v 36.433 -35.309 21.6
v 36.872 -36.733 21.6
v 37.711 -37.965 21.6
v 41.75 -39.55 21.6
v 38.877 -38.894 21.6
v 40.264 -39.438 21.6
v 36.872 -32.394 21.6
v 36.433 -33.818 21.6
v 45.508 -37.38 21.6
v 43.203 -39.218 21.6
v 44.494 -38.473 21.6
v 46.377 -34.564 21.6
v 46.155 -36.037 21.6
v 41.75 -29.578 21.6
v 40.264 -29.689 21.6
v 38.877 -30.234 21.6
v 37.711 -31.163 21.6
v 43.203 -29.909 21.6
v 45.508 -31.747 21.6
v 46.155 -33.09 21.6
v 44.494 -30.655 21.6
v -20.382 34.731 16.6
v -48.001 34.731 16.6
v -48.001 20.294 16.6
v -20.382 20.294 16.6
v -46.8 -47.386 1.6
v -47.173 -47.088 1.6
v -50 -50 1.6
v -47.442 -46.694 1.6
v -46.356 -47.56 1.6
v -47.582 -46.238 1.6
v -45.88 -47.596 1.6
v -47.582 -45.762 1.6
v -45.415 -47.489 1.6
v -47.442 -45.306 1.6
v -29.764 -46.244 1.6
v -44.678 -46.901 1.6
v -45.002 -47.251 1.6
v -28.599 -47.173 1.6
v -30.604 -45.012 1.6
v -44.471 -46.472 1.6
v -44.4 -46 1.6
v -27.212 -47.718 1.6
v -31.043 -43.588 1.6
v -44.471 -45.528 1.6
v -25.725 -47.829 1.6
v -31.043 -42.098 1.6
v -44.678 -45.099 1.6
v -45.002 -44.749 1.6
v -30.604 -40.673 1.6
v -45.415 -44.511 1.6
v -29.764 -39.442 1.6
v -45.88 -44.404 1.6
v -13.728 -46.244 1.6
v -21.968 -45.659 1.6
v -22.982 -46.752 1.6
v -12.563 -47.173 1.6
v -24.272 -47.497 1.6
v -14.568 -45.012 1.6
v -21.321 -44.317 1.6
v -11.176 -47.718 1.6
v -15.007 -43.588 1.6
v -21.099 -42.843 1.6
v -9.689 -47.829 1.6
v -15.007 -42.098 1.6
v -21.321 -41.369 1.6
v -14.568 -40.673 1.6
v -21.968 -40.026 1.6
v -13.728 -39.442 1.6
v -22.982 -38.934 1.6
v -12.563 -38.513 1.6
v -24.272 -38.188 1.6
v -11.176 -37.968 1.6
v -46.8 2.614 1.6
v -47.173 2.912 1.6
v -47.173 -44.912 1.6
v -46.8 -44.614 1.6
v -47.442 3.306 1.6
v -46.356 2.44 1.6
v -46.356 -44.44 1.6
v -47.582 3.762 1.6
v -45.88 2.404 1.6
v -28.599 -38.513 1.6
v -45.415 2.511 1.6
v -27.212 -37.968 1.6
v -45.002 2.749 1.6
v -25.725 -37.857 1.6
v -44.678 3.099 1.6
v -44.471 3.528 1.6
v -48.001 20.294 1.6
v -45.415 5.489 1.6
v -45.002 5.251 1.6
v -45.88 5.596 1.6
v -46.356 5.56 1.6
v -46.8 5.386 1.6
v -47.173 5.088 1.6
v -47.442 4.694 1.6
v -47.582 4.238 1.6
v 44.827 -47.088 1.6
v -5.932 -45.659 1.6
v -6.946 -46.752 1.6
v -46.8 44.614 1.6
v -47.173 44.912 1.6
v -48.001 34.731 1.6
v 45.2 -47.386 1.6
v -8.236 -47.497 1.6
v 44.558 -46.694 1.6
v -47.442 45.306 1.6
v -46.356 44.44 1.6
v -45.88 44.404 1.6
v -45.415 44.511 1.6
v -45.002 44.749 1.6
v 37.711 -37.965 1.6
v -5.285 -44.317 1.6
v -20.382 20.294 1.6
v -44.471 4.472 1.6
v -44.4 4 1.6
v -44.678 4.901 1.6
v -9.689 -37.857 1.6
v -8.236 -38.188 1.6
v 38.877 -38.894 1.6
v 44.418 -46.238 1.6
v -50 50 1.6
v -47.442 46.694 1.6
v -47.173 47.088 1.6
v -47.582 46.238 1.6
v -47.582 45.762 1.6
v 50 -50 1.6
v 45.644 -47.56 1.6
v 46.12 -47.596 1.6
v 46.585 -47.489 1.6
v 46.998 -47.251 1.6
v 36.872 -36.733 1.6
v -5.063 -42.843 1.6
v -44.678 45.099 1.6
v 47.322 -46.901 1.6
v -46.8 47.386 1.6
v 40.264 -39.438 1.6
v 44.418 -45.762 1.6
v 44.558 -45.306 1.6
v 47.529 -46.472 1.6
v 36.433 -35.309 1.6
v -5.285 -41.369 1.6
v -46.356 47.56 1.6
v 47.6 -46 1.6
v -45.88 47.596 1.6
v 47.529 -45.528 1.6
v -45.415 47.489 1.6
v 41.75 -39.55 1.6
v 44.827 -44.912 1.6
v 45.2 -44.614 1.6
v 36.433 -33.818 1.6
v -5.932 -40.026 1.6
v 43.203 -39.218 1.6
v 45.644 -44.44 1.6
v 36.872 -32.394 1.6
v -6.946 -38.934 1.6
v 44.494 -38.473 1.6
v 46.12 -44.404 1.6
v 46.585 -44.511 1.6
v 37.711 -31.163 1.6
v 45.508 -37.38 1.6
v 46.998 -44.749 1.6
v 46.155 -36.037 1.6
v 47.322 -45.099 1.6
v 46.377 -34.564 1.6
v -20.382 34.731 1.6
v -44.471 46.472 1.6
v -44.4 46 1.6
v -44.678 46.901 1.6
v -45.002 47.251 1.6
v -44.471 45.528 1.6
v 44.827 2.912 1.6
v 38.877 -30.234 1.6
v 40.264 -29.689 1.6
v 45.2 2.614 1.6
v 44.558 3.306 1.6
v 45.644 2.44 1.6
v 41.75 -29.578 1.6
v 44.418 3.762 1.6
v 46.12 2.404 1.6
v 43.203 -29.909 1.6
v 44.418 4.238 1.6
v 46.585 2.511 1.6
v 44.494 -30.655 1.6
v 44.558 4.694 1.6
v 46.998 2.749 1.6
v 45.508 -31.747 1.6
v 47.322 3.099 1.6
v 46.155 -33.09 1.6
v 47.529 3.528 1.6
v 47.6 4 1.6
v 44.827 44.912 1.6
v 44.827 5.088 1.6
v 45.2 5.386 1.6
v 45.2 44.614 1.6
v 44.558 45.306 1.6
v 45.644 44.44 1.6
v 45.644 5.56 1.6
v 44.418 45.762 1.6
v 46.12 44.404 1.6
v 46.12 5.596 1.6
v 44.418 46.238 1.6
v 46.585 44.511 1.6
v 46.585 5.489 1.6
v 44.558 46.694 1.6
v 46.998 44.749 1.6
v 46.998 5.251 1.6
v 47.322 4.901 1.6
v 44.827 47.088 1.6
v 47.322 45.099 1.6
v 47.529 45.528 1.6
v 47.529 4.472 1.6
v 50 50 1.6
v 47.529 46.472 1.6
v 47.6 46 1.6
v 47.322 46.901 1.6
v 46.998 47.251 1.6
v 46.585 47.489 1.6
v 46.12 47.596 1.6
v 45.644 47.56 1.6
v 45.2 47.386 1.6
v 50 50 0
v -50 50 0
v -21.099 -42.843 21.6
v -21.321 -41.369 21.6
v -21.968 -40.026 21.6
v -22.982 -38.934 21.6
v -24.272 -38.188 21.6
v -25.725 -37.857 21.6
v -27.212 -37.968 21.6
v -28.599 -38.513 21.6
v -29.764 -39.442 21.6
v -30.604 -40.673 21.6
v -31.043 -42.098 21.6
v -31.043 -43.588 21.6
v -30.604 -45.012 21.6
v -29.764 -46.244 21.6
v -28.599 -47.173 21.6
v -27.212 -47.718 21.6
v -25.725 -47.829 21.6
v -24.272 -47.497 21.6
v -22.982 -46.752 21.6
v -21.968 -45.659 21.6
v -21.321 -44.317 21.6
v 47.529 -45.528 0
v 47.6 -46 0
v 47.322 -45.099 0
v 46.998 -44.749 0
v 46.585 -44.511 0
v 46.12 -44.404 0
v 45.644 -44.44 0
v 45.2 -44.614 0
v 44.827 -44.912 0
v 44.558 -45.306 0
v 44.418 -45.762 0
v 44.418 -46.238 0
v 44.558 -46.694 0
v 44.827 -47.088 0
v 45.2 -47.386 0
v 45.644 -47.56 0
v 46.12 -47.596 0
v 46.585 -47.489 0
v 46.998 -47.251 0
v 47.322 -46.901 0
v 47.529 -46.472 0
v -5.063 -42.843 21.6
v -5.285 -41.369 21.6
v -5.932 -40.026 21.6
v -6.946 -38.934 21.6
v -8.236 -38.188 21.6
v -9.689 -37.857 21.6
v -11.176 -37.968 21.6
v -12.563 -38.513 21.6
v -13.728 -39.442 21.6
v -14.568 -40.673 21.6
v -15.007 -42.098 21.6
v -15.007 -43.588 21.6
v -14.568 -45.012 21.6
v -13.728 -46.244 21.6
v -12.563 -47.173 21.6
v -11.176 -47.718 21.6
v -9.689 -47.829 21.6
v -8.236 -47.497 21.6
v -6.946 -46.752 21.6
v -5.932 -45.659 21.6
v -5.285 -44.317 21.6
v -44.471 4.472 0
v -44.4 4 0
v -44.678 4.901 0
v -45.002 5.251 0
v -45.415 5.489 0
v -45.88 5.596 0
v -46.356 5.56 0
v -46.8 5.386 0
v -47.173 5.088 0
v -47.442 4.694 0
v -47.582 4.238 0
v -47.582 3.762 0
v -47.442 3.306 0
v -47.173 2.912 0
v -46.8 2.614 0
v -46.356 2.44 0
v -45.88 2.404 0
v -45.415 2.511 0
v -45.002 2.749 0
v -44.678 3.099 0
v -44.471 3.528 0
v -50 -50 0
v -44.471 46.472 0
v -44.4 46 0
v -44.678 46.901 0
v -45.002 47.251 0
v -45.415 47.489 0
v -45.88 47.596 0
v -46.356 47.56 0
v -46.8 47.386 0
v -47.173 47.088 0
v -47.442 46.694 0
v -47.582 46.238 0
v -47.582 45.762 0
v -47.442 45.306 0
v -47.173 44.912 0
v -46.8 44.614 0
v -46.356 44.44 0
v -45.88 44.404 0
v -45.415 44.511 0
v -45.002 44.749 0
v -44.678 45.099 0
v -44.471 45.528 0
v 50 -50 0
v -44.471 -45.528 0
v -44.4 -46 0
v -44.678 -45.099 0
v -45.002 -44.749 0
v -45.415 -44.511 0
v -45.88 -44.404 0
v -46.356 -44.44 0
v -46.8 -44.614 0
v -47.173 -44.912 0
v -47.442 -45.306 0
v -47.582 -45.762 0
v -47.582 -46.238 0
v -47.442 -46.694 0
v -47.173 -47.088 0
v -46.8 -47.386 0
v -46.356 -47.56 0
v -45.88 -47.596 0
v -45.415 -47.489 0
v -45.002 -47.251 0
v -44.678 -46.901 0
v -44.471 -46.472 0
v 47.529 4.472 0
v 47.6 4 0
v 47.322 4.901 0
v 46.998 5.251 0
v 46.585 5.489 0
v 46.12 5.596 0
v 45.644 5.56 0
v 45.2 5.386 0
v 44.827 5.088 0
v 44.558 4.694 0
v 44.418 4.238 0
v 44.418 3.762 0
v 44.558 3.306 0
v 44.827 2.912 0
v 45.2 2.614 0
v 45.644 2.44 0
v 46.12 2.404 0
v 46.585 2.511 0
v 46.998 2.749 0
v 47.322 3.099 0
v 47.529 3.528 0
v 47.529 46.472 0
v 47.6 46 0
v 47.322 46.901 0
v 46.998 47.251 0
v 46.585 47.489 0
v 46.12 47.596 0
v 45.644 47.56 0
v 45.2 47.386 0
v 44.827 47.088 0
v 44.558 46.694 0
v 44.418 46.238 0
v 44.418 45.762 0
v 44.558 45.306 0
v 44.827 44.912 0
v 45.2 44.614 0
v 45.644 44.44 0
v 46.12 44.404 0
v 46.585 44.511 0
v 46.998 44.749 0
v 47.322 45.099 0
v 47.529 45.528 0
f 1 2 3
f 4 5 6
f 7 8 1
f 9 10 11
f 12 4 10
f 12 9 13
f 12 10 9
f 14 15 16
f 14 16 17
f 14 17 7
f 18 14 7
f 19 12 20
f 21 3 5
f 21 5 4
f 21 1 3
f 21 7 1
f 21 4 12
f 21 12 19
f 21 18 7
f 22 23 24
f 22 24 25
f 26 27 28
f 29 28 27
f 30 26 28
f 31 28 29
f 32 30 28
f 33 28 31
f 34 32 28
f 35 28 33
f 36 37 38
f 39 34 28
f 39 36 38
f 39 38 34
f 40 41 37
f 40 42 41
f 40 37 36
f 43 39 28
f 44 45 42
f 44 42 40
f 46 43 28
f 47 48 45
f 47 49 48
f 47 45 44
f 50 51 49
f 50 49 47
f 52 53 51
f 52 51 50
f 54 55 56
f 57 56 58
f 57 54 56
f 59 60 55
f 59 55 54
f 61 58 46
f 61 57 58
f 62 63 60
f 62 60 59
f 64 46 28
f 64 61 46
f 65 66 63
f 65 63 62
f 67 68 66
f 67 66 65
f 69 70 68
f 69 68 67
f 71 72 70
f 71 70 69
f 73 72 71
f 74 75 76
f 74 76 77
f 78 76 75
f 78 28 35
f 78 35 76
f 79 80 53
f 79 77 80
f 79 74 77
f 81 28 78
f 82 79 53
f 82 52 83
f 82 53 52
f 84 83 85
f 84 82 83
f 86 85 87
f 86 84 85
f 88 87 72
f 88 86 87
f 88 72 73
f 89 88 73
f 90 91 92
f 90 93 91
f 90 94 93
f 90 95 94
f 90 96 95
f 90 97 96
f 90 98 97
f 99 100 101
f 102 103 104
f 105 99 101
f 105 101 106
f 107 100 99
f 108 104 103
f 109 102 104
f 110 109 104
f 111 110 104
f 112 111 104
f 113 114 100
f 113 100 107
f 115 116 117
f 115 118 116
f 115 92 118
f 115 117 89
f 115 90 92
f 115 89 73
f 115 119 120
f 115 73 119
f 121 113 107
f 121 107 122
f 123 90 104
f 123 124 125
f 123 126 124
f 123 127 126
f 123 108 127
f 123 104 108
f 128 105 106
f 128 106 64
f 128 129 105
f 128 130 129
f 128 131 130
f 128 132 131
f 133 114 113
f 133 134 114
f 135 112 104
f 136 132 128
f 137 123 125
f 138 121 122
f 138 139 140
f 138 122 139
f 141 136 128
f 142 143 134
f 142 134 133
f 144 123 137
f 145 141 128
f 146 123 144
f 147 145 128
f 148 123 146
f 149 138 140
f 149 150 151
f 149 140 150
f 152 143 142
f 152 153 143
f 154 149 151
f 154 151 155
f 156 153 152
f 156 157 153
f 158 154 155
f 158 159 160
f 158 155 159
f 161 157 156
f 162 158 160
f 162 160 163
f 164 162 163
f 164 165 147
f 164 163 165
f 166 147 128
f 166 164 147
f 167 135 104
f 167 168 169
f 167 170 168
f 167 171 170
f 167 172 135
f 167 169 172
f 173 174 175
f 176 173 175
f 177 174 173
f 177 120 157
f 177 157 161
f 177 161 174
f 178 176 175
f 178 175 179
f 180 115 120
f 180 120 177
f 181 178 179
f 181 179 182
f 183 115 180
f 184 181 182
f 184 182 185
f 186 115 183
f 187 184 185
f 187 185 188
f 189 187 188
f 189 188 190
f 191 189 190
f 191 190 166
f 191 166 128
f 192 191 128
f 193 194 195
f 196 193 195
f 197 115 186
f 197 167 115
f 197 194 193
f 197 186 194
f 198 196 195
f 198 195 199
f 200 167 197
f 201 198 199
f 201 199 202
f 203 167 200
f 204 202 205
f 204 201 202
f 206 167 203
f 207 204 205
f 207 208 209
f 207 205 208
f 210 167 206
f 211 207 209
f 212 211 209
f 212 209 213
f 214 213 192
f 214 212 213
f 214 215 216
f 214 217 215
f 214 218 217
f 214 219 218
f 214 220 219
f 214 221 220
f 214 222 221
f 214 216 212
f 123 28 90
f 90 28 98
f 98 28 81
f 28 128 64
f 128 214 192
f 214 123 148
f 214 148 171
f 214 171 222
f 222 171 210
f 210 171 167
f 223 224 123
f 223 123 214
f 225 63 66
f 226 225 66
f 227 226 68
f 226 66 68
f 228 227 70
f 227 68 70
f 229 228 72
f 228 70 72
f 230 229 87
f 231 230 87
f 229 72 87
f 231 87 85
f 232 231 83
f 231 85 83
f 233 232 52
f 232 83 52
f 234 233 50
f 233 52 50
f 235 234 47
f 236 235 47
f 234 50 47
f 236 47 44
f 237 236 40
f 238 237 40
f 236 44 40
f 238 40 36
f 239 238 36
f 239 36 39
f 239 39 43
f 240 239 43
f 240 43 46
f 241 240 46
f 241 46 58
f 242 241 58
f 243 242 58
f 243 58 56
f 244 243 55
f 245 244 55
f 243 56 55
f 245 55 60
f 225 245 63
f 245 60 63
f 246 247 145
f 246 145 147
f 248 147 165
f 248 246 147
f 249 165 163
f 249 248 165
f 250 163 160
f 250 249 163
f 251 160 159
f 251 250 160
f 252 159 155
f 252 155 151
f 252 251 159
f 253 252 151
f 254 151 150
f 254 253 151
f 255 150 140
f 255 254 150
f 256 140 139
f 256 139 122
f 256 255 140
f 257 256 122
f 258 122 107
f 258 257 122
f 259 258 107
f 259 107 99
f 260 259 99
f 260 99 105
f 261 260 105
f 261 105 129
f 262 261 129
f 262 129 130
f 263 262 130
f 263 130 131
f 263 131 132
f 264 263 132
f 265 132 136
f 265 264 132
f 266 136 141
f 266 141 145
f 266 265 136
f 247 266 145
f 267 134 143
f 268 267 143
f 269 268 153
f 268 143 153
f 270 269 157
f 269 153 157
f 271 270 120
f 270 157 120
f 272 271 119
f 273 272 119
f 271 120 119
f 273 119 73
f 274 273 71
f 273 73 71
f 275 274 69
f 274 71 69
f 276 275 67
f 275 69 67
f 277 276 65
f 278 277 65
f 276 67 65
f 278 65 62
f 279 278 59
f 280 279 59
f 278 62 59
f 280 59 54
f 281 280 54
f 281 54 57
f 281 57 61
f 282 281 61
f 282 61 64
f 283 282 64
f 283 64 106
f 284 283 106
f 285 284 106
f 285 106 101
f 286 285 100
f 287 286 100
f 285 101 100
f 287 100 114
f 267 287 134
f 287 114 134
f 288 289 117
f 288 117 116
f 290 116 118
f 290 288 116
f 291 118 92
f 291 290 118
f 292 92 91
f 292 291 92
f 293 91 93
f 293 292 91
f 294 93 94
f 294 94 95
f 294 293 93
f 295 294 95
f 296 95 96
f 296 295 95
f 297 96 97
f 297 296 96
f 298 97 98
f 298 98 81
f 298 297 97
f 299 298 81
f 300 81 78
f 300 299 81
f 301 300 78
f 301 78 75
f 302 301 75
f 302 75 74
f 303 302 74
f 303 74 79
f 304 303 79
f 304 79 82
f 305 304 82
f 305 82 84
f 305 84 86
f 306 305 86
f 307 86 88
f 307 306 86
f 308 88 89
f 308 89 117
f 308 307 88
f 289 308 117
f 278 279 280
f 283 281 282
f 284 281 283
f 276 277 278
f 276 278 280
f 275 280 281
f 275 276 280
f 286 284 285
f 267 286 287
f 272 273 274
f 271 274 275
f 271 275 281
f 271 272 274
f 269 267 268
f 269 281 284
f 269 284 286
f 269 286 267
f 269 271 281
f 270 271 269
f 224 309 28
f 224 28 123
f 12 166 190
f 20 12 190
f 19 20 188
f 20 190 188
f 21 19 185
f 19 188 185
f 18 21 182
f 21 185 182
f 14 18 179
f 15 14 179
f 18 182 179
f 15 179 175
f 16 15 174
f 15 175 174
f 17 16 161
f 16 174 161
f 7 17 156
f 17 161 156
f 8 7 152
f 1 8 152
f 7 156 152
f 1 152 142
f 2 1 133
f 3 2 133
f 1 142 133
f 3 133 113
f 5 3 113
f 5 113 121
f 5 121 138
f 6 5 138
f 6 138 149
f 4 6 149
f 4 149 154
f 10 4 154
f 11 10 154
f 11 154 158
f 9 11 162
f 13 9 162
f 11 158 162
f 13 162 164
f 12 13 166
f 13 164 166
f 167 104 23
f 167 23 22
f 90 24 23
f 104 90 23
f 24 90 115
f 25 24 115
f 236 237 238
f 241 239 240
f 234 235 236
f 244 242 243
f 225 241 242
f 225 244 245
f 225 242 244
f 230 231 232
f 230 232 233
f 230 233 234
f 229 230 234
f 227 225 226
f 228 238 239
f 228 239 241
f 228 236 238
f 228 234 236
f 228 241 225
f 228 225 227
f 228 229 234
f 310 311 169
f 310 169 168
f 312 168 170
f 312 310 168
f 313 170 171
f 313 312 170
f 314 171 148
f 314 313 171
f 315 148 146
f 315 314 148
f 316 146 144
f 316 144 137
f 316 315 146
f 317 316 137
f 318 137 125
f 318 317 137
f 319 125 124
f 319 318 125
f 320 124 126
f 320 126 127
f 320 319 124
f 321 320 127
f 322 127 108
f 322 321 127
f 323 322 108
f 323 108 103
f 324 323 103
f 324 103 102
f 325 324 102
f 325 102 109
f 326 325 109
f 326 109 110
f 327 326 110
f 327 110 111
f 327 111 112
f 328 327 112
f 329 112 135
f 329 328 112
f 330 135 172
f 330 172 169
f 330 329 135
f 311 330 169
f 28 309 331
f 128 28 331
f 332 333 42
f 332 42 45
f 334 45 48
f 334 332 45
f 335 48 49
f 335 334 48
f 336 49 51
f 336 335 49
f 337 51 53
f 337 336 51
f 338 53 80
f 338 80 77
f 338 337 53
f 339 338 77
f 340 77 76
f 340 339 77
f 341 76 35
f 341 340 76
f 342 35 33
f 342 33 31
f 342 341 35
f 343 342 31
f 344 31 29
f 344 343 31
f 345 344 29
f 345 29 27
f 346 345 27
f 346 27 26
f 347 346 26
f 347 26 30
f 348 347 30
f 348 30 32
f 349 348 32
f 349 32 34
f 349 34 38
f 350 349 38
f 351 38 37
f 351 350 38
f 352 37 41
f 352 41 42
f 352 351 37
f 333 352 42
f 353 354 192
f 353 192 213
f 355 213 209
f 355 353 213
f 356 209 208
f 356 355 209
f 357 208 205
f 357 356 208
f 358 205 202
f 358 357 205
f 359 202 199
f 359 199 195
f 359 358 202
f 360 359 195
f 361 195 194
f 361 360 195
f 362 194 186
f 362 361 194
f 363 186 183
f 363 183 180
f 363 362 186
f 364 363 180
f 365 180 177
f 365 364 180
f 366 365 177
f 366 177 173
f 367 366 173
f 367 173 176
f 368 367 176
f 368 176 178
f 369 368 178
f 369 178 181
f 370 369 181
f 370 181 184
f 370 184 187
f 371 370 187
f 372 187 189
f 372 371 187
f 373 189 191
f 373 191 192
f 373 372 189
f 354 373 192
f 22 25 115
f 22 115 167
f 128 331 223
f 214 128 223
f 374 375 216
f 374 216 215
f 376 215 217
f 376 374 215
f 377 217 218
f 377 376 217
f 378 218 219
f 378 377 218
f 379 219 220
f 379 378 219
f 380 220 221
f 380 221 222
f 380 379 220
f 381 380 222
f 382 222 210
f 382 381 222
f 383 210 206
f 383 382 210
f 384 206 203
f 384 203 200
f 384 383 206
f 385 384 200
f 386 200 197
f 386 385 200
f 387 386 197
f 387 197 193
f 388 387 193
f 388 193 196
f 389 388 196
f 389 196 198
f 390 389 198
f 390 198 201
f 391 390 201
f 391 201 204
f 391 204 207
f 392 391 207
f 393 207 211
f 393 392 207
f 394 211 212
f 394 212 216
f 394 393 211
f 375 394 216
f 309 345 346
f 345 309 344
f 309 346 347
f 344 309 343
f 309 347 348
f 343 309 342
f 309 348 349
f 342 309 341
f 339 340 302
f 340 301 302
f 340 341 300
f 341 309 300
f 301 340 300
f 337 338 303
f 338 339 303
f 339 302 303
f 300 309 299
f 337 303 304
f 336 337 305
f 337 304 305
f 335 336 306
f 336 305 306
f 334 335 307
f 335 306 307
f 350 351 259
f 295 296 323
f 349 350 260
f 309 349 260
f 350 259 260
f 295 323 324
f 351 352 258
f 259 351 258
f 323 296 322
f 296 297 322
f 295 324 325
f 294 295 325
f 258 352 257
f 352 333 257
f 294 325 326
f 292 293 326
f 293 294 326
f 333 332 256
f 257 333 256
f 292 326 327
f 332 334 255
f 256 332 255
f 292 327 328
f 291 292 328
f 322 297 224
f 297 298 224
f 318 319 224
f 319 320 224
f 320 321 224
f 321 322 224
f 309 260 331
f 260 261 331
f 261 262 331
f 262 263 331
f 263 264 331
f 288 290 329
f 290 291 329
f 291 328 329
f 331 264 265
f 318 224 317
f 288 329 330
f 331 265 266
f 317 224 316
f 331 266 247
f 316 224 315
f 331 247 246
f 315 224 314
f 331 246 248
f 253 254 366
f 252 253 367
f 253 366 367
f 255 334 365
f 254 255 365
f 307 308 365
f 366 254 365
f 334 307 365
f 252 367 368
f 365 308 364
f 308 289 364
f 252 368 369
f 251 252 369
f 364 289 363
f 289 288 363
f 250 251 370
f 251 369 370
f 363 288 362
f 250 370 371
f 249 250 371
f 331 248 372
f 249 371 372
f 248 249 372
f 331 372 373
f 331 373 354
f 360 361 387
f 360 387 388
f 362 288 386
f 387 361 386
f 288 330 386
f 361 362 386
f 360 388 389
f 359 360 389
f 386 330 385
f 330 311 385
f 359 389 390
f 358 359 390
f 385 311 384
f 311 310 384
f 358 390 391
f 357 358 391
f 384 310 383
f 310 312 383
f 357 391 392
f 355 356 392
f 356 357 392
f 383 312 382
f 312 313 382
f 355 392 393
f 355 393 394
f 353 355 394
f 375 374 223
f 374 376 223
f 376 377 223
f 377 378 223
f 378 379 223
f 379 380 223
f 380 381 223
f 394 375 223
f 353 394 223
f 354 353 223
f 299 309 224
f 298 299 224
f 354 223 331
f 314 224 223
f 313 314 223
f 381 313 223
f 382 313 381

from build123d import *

# Parameters (mm, degrees)
ESQUISSE1_W        = 100
ESQUISSE1_H        = 100
ESQUISSE1_R        = 1.6
BOSS_EXTRU_1_DEPTH = 1.6
ESQUISSE2_R        = 5
BOSS_EXTRU_2_DEPTH = 20
ESQUISSE3_W        = 27.619166331
ESQUISSE3_H        = 14.436937143
BOSS_EXTRU_3_DEPTH = 15


with BuildPart() as part:
    # Esquisse1 → Boss.-Extru.1 (new body)
    with BuildSketch(Plane.XY):
        Rectangle(ESQUISSE1_W, ESQUISSE1_H)
        with Locations((-46, 46)):
            Circle(ESQUISSE1_R, mode=Mode.SUBTRACT)
        with Locations((46, 46)):
            Circle(ESQUISSE1_R, mode=Mode.SUBTRACT)
        with Locations((46, 4)):
            Circle(ESQUISSE1_R, mode=Mode.SUBTRACT)
        with Locations((-46, 4)):
            Circle(ESQUISSE1_R, mode=Mode.SUBTRACT)
        with Locations((-46, -46)):
            Circle(ESQUISSE1_R, mode=Mode.SUBTRACT)
        with Locations((46, -46)):
            Circle(ESQUISSE1_R, mode=Mode.SUBTRACT)
    extrude(amount=BOSS_EXTRU_1_DEPTH)

    # Esquisse2 → Boss.-Extru.2 (add)
    with BuildSketch(Plane.XY.offset(1.6)):
        with Locations((-26.099103373, -42.842866213)):
            Circle(ESQUISSE2_R)
        with Locations((-10.063114572, -42.842866213)):
            Circle(ESQUISSE2_R)
        with Locations((41.376738419, -34.563702957)):
            Circle(ESQUISSE2_R)
    extrude(amount=BOSS_EXTRU_2_DEPTH)

    # Esquisse3 → Boss.-Extru.3 (add)
    with BuildSketch(Plane.XY.offset(1.6)):
        with Locations((-34.191305716, 27.512141018)):
            Rectangle(ESQUISSE3_W, ESQUISSE3_H)
    extrude(amount=BOSS_EXTRU_3_DEPTH)


solid = part.part
